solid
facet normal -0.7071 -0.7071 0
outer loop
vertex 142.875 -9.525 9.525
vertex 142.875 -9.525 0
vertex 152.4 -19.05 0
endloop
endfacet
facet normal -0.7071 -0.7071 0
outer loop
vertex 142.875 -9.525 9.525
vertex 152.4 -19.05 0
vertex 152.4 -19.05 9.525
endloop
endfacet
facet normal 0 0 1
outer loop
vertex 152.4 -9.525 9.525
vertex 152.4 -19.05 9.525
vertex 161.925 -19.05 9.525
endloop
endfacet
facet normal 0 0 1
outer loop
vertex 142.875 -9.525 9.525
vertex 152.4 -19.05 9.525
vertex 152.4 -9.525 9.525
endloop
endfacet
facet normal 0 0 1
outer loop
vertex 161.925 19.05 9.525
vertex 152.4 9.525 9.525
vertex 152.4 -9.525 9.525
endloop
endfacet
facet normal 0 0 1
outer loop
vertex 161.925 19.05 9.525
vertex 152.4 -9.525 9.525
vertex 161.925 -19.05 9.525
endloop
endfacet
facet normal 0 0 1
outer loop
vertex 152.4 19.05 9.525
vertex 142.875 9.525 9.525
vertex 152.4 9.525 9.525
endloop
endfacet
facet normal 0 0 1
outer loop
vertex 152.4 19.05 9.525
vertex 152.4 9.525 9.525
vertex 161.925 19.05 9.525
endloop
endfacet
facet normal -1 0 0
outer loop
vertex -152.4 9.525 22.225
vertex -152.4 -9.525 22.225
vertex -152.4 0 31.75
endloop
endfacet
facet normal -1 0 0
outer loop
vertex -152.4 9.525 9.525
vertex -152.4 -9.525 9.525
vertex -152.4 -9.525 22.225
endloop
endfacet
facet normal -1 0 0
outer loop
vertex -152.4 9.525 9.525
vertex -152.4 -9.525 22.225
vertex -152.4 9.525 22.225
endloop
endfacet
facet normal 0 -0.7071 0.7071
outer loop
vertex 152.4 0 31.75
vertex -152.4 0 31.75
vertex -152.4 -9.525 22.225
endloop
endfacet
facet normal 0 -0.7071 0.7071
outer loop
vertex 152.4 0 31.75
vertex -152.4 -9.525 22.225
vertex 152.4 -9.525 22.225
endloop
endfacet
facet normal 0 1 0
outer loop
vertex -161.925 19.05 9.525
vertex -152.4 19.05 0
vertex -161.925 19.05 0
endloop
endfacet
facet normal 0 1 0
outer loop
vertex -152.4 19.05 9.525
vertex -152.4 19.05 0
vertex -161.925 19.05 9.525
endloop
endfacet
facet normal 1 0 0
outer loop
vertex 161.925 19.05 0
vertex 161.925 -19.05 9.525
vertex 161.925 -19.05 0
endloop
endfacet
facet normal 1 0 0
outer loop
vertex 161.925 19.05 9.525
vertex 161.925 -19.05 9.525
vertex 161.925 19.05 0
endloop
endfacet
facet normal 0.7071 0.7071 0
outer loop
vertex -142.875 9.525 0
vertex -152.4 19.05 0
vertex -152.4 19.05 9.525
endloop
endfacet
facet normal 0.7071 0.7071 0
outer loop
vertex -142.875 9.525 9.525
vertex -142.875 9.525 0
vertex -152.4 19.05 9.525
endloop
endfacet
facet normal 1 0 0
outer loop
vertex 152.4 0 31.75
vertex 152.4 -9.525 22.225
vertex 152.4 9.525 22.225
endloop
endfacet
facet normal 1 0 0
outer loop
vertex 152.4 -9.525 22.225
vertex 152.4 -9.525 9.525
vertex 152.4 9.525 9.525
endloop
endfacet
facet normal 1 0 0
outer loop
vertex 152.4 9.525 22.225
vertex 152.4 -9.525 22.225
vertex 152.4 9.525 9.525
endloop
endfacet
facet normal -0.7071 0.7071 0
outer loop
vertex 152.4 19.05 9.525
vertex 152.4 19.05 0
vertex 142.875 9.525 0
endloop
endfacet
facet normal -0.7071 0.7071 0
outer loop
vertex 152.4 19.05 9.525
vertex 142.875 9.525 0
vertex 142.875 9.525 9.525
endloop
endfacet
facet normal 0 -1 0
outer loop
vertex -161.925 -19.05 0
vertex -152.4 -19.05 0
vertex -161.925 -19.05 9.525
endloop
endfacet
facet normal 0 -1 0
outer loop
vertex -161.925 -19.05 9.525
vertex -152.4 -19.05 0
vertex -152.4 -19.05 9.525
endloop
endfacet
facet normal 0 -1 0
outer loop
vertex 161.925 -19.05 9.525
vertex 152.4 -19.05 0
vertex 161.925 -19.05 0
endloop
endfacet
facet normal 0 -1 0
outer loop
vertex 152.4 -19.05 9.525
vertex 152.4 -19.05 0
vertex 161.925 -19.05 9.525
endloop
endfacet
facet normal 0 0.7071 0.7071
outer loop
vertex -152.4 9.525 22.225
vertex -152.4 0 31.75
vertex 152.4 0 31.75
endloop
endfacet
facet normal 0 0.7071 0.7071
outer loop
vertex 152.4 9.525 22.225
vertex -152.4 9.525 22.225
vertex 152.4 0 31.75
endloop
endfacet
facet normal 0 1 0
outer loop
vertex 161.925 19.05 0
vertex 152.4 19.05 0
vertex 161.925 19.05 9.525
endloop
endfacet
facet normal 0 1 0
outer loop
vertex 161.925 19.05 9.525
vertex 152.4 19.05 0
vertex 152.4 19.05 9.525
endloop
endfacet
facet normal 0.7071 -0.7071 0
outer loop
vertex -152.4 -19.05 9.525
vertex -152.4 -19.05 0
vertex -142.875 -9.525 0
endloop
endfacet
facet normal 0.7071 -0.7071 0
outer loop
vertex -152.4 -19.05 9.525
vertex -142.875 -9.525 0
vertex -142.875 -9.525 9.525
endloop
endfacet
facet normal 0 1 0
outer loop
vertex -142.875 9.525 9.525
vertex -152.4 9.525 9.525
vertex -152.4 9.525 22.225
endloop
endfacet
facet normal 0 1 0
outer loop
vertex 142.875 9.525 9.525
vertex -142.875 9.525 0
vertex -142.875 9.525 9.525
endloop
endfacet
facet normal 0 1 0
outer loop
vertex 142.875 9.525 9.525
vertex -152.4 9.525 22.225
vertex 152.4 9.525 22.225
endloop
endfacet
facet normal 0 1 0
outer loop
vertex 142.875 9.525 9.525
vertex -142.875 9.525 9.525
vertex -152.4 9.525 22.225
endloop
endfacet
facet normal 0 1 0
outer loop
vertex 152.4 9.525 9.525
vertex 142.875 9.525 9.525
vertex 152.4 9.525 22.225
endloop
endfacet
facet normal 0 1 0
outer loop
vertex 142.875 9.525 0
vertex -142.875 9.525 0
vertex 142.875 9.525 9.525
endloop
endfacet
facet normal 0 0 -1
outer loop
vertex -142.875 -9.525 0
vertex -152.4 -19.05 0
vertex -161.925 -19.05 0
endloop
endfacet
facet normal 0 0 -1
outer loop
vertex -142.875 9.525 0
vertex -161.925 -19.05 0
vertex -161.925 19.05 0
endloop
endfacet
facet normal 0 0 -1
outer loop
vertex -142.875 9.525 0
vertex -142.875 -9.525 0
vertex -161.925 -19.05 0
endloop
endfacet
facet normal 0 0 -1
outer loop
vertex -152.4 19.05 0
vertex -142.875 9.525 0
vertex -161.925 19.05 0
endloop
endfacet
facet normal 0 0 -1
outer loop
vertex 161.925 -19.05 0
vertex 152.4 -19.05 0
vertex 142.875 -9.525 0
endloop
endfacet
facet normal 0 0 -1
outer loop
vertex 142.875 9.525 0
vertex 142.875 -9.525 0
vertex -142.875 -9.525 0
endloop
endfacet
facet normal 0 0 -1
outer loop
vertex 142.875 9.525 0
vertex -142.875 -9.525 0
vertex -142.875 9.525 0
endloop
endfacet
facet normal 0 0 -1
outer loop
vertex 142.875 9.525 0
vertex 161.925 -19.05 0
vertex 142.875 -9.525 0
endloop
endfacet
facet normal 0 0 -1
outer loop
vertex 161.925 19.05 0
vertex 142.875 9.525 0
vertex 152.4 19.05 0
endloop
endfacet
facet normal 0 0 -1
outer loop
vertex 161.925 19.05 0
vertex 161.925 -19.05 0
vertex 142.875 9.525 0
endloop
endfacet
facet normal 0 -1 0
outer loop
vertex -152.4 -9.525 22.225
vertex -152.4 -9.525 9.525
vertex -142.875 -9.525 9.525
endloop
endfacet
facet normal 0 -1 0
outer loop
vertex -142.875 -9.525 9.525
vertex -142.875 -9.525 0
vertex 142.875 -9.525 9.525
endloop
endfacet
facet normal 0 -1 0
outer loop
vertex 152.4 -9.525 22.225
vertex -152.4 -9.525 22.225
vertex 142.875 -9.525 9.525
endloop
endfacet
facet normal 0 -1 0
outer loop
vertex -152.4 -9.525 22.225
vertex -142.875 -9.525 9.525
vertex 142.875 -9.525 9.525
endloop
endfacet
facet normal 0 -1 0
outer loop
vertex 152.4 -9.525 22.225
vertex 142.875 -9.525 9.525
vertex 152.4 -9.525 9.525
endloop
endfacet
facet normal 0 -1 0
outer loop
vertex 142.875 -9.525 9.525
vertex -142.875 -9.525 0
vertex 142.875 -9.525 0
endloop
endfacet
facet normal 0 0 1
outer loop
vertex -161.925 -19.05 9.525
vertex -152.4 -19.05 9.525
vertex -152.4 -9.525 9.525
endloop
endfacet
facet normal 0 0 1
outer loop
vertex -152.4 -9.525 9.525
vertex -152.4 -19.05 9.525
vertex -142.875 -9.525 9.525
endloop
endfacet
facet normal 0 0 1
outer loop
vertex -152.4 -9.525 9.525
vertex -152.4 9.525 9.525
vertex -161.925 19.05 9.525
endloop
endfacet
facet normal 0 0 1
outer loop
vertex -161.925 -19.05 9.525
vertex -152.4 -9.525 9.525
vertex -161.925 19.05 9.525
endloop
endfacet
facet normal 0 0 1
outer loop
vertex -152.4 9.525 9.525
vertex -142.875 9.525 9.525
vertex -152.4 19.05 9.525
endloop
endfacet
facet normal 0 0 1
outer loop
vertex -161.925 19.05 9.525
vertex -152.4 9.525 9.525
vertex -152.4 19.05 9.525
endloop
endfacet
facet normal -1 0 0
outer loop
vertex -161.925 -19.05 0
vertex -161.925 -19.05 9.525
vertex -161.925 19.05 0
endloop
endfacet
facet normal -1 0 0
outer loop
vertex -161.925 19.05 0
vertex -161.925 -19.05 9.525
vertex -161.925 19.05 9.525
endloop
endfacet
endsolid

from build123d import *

# Parameters (mm, degrees)
F0_W     = 304.8
F0_H     = 19.05
F1_DEPTH = 31.75
F2_SIZE  = 9.52499
F3_W     = 38.1
F3_H     = 9.525
F4_DEPTH = 9.525
F5_SIZE  = 9.52499


# Not quite as in the source:
# - a fillet or chamfer is up to 0.001 mm smaller than in the source, because OpenCascade refuses the exact size
# - a pattern or mirror of a feature is missing from the dataset's text; its kind, count and spacing are read off the source's solid


with BuildPart() as f1:
    # F0 (on Top) → F1 (new body)
    with BuildSketch(Plane.XY):
        Rectangle(F0_W, F0_H)
    extrude(amount=F1_DEPTH)

    # F2 (size 9.525 in the source; OpenCascade refuses exactly that, so slightly less here)
    f2_edges = [f1.edges().sort_by_distance(p)[0] for p in [
        (0, -9.525, 31.75),
        (0, 9.525, 31.75),
    ]]
    chamfer(f2_edges, length=F2_SIZE)

    # F3 (on face) → F4 (join)
    with BuildSketch(Plane.YZ.offset(152.4)):
        with Locations((0, 4.7625)):
            Rectangle(F3_W, F3_H)
    f4 = extrude(amount=F4_DEPTH)

    # F4_copies: F4 across plane
    add(f4.mirror(Plane(origin=(0, 0, 0), x_dir=(0, 0, -1), z_dir=(-1, 0, 0))))

    # F5 (size 9.525 in the source; OpenCascade refuses exactly that, so slightly less here)
    f5_edges = [f1.edges().sort_by_distance(p)[0] for p in [
        (152.4, -9.525, 4.7625),
        (152.4, 9.525, 4.7625),
        (-152.4, -9.525, 4.7625),
        (-152.4, 9.525, 4.7625),
    ]]
    chamfer(f5_edges, length=F5_SIZE)


solid = f1.part
